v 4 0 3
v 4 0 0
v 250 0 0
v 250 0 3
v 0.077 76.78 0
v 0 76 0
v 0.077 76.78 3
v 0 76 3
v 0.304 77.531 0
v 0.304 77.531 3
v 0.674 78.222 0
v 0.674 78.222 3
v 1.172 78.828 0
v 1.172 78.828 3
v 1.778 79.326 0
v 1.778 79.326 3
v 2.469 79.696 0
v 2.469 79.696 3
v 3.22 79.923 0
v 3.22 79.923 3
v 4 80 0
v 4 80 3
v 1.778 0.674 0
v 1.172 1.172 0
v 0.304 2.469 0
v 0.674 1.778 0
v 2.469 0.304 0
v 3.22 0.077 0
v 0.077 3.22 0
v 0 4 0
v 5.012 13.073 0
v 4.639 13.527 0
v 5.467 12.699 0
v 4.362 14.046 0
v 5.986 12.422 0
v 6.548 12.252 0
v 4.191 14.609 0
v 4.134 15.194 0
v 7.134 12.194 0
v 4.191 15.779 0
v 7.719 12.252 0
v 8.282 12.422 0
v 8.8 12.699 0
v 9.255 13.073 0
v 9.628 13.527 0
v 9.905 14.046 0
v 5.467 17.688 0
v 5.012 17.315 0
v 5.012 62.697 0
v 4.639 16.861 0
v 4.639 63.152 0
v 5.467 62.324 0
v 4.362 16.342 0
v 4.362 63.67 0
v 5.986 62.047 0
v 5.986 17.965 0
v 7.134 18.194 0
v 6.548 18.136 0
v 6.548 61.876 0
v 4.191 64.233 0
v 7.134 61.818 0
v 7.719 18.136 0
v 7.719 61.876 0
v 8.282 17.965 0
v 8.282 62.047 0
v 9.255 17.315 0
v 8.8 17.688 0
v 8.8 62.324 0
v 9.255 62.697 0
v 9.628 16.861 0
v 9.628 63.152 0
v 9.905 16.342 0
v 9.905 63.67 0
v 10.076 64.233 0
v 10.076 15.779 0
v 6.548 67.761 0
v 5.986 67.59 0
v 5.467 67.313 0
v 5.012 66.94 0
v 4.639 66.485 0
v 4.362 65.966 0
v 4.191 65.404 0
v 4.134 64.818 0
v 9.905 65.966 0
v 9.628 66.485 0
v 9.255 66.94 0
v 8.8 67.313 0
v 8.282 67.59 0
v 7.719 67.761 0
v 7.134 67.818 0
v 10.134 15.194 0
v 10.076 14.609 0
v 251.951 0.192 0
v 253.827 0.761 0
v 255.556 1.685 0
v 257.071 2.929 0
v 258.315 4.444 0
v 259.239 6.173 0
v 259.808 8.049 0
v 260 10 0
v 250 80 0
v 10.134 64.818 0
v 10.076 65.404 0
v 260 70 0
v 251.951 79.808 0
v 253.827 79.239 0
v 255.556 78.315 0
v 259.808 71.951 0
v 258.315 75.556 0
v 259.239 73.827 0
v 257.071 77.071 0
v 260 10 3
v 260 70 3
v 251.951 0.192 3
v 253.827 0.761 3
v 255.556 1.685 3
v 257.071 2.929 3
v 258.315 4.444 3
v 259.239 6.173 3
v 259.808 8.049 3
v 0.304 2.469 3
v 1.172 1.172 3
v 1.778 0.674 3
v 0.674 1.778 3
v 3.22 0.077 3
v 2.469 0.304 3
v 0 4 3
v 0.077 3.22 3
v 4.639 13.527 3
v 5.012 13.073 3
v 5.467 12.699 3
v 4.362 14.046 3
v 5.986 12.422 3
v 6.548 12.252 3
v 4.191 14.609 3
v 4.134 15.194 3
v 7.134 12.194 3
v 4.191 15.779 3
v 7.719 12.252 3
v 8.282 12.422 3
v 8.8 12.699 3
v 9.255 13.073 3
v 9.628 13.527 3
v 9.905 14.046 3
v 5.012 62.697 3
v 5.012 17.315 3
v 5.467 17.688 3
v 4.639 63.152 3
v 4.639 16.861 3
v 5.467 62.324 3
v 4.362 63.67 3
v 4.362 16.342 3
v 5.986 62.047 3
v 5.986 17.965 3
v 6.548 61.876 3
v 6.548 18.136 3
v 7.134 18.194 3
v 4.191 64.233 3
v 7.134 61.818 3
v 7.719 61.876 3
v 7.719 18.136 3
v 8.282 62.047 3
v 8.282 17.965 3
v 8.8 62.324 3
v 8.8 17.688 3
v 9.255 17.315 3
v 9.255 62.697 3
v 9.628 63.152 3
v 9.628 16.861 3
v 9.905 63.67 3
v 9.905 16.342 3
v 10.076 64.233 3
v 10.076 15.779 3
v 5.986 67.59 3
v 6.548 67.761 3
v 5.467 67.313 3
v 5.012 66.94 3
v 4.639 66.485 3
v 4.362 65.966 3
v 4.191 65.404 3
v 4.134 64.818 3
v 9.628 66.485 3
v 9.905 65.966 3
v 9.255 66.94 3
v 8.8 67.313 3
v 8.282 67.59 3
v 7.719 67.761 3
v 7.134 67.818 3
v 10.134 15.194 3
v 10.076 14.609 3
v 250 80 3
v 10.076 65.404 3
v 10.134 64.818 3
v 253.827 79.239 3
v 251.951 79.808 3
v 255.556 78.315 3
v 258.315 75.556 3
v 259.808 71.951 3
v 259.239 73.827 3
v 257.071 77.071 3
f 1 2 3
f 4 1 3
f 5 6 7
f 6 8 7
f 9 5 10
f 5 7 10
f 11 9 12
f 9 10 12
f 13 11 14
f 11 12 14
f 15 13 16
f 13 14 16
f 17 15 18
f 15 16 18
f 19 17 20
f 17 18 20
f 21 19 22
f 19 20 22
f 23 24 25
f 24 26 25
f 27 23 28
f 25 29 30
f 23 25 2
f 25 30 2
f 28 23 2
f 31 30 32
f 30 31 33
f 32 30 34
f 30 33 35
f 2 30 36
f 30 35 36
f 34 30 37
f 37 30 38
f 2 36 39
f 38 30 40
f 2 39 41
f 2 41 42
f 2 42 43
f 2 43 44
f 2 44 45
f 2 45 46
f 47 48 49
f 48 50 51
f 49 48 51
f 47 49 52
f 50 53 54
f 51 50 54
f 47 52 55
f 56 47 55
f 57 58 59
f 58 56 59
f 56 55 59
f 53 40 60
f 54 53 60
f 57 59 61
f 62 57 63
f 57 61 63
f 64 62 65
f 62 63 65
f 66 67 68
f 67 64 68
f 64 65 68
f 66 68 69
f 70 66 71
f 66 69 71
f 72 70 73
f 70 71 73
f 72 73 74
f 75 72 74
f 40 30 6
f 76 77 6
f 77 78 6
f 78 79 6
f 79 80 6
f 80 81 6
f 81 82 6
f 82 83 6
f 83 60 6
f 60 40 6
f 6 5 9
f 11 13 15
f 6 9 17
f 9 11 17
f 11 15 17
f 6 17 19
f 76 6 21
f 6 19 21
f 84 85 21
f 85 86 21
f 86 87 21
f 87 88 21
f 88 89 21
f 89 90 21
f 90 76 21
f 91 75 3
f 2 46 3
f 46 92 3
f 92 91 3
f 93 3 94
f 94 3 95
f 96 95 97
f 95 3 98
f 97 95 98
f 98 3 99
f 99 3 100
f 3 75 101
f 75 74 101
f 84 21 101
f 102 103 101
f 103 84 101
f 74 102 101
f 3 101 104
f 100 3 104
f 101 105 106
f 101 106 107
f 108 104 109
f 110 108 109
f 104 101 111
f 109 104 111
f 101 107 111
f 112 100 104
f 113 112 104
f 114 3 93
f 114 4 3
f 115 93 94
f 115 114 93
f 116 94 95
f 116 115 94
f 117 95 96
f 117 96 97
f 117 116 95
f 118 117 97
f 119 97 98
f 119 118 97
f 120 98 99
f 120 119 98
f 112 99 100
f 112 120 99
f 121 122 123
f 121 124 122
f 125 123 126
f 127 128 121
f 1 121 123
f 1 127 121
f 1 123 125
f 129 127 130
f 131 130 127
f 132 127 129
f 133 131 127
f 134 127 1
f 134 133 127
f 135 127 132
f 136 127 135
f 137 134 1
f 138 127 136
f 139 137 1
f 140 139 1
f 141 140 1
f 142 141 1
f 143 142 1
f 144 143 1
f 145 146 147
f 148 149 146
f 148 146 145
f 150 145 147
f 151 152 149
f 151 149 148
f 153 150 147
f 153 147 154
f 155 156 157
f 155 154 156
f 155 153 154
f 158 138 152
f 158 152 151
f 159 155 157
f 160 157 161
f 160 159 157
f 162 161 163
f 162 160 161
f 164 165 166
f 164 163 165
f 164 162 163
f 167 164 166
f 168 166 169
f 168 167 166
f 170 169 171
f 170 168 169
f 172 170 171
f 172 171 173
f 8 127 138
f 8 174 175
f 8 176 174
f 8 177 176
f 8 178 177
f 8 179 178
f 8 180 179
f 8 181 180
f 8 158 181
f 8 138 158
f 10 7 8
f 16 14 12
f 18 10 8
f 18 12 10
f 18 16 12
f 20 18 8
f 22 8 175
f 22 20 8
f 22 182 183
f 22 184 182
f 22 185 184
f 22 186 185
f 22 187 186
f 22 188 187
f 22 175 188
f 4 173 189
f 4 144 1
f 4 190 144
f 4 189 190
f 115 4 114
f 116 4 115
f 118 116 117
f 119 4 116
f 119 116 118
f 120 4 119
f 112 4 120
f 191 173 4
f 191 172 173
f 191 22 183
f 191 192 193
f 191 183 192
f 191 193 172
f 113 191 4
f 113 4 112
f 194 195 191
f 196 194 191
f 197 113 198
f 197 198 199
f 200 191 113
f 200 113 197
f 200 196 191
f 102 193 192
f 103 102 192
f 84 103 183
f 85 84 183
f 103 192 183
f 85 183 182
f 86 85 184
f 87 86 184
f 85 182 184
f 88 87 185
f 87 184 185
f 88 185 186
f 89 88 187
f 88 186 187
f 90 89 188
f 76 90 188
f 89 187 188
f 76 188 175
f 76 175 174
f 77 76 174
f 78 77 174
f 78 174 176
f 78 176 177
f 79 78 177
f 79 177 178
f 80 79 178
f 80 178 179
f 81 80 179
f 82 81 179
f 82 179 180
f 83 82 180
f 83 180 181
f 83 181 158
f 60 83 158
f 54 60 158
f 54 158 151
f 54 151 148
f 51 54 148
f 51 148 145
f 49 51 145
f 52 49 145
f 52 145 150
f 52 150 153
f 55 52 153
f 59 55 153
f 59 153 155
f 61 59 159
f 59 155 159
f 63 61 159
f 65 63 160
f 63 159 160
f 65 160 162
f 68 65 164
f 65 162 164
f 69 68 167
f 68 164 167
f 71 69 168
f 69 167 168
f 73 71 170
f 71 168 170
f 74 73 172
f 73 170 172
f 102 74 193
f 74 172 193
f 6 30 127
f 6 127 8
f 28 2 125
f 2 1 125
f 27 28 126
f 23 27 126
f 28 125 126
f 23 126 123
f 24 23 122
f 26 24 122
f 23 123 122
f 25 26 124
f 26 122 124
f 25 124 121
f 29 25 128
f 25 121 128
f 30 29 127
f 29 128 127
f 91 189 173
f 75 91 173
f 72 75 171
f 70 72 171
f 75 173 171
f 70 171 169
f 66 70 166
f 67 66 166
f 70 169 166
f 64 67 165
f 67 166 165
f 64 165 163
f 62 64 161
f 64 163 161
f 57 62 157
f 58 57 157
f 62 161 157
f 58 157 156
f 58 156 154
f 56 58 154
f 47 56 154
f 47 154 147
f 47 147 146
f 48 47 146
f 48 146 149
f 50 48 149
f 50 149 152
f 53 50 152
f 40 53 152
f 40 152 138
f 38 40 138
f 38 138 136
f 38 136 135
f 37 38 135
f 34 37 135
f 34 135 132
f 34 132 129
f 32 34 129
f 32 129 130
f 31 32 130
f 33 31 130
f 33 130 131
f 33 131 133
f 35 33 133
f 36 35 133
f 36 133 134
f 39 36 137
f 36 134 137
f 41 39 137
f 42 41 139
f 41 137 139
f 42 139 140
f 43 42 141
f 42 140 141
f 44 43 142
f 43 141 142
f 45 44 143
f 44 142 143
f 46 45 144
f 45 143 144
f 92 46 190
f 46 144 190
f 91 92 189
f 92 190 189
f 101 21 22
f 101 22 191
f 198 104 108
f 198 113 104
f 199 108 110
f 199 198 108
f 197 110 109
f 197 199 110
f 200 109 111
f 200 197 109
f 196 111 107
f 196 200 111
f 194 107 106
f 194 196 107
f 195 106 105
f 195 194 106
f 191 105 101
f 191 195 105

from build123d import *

# Parameters (mm, degrees)
ESQUISSE1_W             = 260
ESQUISSE1_H             = 80
BOSS_EXTRU_1_DEPTH      = 3
CONG_1_R                = 10
ESQUISSE3_R             = 3
ENL_V_MAT_EXTRU_1_DEPTH = 10
CONG_2_R                = 4


with BuildPart() as part:
    # Esquisse1 → Boss.-Extru.1 (new body)
    with BuildSketch(Plane.XY):
        with Locations((130, 40)):
            Rectangle(ESQUISSE1_W, ESQUISSE1_H)
    extrude(amount=BOSS_EXTRU_1_DEPTH)

    # Congé1
    cong_1_edges = [part.edges().sort_by_distance(p)[0] for p in [
        (260, 80, 1.5),
        (260, 0, 1.5),
    ]]
    fillet(cong_1_edges, radius=CONG_1_R)

    # Esquisse3 → Enlèv. mat.-Extru.1 (cut)
    with BuildSketch(Plane.XY.offset(3)):
        with Locations((7.133710771, 64.818289226)):
            Circle(ESQUISSE3_R)
        with Locations((7.133710771, 15.193861177)):
            Circle(ESQUISSE3_R)
    extrude(amount=-ENL_V_MAT_EXTRU_1_DEPTH, mode=Mode.SUBTRACT)

    # Congé2
    cong_2_edges = [part.edges().sort_by_distance(p)[0] for p in [
        (0, 80, 1.5),
        (0, 0, 1.5),
    ]]
    fillet(cong_2_edges, radius=CONG_2_R)


solid = part.part
